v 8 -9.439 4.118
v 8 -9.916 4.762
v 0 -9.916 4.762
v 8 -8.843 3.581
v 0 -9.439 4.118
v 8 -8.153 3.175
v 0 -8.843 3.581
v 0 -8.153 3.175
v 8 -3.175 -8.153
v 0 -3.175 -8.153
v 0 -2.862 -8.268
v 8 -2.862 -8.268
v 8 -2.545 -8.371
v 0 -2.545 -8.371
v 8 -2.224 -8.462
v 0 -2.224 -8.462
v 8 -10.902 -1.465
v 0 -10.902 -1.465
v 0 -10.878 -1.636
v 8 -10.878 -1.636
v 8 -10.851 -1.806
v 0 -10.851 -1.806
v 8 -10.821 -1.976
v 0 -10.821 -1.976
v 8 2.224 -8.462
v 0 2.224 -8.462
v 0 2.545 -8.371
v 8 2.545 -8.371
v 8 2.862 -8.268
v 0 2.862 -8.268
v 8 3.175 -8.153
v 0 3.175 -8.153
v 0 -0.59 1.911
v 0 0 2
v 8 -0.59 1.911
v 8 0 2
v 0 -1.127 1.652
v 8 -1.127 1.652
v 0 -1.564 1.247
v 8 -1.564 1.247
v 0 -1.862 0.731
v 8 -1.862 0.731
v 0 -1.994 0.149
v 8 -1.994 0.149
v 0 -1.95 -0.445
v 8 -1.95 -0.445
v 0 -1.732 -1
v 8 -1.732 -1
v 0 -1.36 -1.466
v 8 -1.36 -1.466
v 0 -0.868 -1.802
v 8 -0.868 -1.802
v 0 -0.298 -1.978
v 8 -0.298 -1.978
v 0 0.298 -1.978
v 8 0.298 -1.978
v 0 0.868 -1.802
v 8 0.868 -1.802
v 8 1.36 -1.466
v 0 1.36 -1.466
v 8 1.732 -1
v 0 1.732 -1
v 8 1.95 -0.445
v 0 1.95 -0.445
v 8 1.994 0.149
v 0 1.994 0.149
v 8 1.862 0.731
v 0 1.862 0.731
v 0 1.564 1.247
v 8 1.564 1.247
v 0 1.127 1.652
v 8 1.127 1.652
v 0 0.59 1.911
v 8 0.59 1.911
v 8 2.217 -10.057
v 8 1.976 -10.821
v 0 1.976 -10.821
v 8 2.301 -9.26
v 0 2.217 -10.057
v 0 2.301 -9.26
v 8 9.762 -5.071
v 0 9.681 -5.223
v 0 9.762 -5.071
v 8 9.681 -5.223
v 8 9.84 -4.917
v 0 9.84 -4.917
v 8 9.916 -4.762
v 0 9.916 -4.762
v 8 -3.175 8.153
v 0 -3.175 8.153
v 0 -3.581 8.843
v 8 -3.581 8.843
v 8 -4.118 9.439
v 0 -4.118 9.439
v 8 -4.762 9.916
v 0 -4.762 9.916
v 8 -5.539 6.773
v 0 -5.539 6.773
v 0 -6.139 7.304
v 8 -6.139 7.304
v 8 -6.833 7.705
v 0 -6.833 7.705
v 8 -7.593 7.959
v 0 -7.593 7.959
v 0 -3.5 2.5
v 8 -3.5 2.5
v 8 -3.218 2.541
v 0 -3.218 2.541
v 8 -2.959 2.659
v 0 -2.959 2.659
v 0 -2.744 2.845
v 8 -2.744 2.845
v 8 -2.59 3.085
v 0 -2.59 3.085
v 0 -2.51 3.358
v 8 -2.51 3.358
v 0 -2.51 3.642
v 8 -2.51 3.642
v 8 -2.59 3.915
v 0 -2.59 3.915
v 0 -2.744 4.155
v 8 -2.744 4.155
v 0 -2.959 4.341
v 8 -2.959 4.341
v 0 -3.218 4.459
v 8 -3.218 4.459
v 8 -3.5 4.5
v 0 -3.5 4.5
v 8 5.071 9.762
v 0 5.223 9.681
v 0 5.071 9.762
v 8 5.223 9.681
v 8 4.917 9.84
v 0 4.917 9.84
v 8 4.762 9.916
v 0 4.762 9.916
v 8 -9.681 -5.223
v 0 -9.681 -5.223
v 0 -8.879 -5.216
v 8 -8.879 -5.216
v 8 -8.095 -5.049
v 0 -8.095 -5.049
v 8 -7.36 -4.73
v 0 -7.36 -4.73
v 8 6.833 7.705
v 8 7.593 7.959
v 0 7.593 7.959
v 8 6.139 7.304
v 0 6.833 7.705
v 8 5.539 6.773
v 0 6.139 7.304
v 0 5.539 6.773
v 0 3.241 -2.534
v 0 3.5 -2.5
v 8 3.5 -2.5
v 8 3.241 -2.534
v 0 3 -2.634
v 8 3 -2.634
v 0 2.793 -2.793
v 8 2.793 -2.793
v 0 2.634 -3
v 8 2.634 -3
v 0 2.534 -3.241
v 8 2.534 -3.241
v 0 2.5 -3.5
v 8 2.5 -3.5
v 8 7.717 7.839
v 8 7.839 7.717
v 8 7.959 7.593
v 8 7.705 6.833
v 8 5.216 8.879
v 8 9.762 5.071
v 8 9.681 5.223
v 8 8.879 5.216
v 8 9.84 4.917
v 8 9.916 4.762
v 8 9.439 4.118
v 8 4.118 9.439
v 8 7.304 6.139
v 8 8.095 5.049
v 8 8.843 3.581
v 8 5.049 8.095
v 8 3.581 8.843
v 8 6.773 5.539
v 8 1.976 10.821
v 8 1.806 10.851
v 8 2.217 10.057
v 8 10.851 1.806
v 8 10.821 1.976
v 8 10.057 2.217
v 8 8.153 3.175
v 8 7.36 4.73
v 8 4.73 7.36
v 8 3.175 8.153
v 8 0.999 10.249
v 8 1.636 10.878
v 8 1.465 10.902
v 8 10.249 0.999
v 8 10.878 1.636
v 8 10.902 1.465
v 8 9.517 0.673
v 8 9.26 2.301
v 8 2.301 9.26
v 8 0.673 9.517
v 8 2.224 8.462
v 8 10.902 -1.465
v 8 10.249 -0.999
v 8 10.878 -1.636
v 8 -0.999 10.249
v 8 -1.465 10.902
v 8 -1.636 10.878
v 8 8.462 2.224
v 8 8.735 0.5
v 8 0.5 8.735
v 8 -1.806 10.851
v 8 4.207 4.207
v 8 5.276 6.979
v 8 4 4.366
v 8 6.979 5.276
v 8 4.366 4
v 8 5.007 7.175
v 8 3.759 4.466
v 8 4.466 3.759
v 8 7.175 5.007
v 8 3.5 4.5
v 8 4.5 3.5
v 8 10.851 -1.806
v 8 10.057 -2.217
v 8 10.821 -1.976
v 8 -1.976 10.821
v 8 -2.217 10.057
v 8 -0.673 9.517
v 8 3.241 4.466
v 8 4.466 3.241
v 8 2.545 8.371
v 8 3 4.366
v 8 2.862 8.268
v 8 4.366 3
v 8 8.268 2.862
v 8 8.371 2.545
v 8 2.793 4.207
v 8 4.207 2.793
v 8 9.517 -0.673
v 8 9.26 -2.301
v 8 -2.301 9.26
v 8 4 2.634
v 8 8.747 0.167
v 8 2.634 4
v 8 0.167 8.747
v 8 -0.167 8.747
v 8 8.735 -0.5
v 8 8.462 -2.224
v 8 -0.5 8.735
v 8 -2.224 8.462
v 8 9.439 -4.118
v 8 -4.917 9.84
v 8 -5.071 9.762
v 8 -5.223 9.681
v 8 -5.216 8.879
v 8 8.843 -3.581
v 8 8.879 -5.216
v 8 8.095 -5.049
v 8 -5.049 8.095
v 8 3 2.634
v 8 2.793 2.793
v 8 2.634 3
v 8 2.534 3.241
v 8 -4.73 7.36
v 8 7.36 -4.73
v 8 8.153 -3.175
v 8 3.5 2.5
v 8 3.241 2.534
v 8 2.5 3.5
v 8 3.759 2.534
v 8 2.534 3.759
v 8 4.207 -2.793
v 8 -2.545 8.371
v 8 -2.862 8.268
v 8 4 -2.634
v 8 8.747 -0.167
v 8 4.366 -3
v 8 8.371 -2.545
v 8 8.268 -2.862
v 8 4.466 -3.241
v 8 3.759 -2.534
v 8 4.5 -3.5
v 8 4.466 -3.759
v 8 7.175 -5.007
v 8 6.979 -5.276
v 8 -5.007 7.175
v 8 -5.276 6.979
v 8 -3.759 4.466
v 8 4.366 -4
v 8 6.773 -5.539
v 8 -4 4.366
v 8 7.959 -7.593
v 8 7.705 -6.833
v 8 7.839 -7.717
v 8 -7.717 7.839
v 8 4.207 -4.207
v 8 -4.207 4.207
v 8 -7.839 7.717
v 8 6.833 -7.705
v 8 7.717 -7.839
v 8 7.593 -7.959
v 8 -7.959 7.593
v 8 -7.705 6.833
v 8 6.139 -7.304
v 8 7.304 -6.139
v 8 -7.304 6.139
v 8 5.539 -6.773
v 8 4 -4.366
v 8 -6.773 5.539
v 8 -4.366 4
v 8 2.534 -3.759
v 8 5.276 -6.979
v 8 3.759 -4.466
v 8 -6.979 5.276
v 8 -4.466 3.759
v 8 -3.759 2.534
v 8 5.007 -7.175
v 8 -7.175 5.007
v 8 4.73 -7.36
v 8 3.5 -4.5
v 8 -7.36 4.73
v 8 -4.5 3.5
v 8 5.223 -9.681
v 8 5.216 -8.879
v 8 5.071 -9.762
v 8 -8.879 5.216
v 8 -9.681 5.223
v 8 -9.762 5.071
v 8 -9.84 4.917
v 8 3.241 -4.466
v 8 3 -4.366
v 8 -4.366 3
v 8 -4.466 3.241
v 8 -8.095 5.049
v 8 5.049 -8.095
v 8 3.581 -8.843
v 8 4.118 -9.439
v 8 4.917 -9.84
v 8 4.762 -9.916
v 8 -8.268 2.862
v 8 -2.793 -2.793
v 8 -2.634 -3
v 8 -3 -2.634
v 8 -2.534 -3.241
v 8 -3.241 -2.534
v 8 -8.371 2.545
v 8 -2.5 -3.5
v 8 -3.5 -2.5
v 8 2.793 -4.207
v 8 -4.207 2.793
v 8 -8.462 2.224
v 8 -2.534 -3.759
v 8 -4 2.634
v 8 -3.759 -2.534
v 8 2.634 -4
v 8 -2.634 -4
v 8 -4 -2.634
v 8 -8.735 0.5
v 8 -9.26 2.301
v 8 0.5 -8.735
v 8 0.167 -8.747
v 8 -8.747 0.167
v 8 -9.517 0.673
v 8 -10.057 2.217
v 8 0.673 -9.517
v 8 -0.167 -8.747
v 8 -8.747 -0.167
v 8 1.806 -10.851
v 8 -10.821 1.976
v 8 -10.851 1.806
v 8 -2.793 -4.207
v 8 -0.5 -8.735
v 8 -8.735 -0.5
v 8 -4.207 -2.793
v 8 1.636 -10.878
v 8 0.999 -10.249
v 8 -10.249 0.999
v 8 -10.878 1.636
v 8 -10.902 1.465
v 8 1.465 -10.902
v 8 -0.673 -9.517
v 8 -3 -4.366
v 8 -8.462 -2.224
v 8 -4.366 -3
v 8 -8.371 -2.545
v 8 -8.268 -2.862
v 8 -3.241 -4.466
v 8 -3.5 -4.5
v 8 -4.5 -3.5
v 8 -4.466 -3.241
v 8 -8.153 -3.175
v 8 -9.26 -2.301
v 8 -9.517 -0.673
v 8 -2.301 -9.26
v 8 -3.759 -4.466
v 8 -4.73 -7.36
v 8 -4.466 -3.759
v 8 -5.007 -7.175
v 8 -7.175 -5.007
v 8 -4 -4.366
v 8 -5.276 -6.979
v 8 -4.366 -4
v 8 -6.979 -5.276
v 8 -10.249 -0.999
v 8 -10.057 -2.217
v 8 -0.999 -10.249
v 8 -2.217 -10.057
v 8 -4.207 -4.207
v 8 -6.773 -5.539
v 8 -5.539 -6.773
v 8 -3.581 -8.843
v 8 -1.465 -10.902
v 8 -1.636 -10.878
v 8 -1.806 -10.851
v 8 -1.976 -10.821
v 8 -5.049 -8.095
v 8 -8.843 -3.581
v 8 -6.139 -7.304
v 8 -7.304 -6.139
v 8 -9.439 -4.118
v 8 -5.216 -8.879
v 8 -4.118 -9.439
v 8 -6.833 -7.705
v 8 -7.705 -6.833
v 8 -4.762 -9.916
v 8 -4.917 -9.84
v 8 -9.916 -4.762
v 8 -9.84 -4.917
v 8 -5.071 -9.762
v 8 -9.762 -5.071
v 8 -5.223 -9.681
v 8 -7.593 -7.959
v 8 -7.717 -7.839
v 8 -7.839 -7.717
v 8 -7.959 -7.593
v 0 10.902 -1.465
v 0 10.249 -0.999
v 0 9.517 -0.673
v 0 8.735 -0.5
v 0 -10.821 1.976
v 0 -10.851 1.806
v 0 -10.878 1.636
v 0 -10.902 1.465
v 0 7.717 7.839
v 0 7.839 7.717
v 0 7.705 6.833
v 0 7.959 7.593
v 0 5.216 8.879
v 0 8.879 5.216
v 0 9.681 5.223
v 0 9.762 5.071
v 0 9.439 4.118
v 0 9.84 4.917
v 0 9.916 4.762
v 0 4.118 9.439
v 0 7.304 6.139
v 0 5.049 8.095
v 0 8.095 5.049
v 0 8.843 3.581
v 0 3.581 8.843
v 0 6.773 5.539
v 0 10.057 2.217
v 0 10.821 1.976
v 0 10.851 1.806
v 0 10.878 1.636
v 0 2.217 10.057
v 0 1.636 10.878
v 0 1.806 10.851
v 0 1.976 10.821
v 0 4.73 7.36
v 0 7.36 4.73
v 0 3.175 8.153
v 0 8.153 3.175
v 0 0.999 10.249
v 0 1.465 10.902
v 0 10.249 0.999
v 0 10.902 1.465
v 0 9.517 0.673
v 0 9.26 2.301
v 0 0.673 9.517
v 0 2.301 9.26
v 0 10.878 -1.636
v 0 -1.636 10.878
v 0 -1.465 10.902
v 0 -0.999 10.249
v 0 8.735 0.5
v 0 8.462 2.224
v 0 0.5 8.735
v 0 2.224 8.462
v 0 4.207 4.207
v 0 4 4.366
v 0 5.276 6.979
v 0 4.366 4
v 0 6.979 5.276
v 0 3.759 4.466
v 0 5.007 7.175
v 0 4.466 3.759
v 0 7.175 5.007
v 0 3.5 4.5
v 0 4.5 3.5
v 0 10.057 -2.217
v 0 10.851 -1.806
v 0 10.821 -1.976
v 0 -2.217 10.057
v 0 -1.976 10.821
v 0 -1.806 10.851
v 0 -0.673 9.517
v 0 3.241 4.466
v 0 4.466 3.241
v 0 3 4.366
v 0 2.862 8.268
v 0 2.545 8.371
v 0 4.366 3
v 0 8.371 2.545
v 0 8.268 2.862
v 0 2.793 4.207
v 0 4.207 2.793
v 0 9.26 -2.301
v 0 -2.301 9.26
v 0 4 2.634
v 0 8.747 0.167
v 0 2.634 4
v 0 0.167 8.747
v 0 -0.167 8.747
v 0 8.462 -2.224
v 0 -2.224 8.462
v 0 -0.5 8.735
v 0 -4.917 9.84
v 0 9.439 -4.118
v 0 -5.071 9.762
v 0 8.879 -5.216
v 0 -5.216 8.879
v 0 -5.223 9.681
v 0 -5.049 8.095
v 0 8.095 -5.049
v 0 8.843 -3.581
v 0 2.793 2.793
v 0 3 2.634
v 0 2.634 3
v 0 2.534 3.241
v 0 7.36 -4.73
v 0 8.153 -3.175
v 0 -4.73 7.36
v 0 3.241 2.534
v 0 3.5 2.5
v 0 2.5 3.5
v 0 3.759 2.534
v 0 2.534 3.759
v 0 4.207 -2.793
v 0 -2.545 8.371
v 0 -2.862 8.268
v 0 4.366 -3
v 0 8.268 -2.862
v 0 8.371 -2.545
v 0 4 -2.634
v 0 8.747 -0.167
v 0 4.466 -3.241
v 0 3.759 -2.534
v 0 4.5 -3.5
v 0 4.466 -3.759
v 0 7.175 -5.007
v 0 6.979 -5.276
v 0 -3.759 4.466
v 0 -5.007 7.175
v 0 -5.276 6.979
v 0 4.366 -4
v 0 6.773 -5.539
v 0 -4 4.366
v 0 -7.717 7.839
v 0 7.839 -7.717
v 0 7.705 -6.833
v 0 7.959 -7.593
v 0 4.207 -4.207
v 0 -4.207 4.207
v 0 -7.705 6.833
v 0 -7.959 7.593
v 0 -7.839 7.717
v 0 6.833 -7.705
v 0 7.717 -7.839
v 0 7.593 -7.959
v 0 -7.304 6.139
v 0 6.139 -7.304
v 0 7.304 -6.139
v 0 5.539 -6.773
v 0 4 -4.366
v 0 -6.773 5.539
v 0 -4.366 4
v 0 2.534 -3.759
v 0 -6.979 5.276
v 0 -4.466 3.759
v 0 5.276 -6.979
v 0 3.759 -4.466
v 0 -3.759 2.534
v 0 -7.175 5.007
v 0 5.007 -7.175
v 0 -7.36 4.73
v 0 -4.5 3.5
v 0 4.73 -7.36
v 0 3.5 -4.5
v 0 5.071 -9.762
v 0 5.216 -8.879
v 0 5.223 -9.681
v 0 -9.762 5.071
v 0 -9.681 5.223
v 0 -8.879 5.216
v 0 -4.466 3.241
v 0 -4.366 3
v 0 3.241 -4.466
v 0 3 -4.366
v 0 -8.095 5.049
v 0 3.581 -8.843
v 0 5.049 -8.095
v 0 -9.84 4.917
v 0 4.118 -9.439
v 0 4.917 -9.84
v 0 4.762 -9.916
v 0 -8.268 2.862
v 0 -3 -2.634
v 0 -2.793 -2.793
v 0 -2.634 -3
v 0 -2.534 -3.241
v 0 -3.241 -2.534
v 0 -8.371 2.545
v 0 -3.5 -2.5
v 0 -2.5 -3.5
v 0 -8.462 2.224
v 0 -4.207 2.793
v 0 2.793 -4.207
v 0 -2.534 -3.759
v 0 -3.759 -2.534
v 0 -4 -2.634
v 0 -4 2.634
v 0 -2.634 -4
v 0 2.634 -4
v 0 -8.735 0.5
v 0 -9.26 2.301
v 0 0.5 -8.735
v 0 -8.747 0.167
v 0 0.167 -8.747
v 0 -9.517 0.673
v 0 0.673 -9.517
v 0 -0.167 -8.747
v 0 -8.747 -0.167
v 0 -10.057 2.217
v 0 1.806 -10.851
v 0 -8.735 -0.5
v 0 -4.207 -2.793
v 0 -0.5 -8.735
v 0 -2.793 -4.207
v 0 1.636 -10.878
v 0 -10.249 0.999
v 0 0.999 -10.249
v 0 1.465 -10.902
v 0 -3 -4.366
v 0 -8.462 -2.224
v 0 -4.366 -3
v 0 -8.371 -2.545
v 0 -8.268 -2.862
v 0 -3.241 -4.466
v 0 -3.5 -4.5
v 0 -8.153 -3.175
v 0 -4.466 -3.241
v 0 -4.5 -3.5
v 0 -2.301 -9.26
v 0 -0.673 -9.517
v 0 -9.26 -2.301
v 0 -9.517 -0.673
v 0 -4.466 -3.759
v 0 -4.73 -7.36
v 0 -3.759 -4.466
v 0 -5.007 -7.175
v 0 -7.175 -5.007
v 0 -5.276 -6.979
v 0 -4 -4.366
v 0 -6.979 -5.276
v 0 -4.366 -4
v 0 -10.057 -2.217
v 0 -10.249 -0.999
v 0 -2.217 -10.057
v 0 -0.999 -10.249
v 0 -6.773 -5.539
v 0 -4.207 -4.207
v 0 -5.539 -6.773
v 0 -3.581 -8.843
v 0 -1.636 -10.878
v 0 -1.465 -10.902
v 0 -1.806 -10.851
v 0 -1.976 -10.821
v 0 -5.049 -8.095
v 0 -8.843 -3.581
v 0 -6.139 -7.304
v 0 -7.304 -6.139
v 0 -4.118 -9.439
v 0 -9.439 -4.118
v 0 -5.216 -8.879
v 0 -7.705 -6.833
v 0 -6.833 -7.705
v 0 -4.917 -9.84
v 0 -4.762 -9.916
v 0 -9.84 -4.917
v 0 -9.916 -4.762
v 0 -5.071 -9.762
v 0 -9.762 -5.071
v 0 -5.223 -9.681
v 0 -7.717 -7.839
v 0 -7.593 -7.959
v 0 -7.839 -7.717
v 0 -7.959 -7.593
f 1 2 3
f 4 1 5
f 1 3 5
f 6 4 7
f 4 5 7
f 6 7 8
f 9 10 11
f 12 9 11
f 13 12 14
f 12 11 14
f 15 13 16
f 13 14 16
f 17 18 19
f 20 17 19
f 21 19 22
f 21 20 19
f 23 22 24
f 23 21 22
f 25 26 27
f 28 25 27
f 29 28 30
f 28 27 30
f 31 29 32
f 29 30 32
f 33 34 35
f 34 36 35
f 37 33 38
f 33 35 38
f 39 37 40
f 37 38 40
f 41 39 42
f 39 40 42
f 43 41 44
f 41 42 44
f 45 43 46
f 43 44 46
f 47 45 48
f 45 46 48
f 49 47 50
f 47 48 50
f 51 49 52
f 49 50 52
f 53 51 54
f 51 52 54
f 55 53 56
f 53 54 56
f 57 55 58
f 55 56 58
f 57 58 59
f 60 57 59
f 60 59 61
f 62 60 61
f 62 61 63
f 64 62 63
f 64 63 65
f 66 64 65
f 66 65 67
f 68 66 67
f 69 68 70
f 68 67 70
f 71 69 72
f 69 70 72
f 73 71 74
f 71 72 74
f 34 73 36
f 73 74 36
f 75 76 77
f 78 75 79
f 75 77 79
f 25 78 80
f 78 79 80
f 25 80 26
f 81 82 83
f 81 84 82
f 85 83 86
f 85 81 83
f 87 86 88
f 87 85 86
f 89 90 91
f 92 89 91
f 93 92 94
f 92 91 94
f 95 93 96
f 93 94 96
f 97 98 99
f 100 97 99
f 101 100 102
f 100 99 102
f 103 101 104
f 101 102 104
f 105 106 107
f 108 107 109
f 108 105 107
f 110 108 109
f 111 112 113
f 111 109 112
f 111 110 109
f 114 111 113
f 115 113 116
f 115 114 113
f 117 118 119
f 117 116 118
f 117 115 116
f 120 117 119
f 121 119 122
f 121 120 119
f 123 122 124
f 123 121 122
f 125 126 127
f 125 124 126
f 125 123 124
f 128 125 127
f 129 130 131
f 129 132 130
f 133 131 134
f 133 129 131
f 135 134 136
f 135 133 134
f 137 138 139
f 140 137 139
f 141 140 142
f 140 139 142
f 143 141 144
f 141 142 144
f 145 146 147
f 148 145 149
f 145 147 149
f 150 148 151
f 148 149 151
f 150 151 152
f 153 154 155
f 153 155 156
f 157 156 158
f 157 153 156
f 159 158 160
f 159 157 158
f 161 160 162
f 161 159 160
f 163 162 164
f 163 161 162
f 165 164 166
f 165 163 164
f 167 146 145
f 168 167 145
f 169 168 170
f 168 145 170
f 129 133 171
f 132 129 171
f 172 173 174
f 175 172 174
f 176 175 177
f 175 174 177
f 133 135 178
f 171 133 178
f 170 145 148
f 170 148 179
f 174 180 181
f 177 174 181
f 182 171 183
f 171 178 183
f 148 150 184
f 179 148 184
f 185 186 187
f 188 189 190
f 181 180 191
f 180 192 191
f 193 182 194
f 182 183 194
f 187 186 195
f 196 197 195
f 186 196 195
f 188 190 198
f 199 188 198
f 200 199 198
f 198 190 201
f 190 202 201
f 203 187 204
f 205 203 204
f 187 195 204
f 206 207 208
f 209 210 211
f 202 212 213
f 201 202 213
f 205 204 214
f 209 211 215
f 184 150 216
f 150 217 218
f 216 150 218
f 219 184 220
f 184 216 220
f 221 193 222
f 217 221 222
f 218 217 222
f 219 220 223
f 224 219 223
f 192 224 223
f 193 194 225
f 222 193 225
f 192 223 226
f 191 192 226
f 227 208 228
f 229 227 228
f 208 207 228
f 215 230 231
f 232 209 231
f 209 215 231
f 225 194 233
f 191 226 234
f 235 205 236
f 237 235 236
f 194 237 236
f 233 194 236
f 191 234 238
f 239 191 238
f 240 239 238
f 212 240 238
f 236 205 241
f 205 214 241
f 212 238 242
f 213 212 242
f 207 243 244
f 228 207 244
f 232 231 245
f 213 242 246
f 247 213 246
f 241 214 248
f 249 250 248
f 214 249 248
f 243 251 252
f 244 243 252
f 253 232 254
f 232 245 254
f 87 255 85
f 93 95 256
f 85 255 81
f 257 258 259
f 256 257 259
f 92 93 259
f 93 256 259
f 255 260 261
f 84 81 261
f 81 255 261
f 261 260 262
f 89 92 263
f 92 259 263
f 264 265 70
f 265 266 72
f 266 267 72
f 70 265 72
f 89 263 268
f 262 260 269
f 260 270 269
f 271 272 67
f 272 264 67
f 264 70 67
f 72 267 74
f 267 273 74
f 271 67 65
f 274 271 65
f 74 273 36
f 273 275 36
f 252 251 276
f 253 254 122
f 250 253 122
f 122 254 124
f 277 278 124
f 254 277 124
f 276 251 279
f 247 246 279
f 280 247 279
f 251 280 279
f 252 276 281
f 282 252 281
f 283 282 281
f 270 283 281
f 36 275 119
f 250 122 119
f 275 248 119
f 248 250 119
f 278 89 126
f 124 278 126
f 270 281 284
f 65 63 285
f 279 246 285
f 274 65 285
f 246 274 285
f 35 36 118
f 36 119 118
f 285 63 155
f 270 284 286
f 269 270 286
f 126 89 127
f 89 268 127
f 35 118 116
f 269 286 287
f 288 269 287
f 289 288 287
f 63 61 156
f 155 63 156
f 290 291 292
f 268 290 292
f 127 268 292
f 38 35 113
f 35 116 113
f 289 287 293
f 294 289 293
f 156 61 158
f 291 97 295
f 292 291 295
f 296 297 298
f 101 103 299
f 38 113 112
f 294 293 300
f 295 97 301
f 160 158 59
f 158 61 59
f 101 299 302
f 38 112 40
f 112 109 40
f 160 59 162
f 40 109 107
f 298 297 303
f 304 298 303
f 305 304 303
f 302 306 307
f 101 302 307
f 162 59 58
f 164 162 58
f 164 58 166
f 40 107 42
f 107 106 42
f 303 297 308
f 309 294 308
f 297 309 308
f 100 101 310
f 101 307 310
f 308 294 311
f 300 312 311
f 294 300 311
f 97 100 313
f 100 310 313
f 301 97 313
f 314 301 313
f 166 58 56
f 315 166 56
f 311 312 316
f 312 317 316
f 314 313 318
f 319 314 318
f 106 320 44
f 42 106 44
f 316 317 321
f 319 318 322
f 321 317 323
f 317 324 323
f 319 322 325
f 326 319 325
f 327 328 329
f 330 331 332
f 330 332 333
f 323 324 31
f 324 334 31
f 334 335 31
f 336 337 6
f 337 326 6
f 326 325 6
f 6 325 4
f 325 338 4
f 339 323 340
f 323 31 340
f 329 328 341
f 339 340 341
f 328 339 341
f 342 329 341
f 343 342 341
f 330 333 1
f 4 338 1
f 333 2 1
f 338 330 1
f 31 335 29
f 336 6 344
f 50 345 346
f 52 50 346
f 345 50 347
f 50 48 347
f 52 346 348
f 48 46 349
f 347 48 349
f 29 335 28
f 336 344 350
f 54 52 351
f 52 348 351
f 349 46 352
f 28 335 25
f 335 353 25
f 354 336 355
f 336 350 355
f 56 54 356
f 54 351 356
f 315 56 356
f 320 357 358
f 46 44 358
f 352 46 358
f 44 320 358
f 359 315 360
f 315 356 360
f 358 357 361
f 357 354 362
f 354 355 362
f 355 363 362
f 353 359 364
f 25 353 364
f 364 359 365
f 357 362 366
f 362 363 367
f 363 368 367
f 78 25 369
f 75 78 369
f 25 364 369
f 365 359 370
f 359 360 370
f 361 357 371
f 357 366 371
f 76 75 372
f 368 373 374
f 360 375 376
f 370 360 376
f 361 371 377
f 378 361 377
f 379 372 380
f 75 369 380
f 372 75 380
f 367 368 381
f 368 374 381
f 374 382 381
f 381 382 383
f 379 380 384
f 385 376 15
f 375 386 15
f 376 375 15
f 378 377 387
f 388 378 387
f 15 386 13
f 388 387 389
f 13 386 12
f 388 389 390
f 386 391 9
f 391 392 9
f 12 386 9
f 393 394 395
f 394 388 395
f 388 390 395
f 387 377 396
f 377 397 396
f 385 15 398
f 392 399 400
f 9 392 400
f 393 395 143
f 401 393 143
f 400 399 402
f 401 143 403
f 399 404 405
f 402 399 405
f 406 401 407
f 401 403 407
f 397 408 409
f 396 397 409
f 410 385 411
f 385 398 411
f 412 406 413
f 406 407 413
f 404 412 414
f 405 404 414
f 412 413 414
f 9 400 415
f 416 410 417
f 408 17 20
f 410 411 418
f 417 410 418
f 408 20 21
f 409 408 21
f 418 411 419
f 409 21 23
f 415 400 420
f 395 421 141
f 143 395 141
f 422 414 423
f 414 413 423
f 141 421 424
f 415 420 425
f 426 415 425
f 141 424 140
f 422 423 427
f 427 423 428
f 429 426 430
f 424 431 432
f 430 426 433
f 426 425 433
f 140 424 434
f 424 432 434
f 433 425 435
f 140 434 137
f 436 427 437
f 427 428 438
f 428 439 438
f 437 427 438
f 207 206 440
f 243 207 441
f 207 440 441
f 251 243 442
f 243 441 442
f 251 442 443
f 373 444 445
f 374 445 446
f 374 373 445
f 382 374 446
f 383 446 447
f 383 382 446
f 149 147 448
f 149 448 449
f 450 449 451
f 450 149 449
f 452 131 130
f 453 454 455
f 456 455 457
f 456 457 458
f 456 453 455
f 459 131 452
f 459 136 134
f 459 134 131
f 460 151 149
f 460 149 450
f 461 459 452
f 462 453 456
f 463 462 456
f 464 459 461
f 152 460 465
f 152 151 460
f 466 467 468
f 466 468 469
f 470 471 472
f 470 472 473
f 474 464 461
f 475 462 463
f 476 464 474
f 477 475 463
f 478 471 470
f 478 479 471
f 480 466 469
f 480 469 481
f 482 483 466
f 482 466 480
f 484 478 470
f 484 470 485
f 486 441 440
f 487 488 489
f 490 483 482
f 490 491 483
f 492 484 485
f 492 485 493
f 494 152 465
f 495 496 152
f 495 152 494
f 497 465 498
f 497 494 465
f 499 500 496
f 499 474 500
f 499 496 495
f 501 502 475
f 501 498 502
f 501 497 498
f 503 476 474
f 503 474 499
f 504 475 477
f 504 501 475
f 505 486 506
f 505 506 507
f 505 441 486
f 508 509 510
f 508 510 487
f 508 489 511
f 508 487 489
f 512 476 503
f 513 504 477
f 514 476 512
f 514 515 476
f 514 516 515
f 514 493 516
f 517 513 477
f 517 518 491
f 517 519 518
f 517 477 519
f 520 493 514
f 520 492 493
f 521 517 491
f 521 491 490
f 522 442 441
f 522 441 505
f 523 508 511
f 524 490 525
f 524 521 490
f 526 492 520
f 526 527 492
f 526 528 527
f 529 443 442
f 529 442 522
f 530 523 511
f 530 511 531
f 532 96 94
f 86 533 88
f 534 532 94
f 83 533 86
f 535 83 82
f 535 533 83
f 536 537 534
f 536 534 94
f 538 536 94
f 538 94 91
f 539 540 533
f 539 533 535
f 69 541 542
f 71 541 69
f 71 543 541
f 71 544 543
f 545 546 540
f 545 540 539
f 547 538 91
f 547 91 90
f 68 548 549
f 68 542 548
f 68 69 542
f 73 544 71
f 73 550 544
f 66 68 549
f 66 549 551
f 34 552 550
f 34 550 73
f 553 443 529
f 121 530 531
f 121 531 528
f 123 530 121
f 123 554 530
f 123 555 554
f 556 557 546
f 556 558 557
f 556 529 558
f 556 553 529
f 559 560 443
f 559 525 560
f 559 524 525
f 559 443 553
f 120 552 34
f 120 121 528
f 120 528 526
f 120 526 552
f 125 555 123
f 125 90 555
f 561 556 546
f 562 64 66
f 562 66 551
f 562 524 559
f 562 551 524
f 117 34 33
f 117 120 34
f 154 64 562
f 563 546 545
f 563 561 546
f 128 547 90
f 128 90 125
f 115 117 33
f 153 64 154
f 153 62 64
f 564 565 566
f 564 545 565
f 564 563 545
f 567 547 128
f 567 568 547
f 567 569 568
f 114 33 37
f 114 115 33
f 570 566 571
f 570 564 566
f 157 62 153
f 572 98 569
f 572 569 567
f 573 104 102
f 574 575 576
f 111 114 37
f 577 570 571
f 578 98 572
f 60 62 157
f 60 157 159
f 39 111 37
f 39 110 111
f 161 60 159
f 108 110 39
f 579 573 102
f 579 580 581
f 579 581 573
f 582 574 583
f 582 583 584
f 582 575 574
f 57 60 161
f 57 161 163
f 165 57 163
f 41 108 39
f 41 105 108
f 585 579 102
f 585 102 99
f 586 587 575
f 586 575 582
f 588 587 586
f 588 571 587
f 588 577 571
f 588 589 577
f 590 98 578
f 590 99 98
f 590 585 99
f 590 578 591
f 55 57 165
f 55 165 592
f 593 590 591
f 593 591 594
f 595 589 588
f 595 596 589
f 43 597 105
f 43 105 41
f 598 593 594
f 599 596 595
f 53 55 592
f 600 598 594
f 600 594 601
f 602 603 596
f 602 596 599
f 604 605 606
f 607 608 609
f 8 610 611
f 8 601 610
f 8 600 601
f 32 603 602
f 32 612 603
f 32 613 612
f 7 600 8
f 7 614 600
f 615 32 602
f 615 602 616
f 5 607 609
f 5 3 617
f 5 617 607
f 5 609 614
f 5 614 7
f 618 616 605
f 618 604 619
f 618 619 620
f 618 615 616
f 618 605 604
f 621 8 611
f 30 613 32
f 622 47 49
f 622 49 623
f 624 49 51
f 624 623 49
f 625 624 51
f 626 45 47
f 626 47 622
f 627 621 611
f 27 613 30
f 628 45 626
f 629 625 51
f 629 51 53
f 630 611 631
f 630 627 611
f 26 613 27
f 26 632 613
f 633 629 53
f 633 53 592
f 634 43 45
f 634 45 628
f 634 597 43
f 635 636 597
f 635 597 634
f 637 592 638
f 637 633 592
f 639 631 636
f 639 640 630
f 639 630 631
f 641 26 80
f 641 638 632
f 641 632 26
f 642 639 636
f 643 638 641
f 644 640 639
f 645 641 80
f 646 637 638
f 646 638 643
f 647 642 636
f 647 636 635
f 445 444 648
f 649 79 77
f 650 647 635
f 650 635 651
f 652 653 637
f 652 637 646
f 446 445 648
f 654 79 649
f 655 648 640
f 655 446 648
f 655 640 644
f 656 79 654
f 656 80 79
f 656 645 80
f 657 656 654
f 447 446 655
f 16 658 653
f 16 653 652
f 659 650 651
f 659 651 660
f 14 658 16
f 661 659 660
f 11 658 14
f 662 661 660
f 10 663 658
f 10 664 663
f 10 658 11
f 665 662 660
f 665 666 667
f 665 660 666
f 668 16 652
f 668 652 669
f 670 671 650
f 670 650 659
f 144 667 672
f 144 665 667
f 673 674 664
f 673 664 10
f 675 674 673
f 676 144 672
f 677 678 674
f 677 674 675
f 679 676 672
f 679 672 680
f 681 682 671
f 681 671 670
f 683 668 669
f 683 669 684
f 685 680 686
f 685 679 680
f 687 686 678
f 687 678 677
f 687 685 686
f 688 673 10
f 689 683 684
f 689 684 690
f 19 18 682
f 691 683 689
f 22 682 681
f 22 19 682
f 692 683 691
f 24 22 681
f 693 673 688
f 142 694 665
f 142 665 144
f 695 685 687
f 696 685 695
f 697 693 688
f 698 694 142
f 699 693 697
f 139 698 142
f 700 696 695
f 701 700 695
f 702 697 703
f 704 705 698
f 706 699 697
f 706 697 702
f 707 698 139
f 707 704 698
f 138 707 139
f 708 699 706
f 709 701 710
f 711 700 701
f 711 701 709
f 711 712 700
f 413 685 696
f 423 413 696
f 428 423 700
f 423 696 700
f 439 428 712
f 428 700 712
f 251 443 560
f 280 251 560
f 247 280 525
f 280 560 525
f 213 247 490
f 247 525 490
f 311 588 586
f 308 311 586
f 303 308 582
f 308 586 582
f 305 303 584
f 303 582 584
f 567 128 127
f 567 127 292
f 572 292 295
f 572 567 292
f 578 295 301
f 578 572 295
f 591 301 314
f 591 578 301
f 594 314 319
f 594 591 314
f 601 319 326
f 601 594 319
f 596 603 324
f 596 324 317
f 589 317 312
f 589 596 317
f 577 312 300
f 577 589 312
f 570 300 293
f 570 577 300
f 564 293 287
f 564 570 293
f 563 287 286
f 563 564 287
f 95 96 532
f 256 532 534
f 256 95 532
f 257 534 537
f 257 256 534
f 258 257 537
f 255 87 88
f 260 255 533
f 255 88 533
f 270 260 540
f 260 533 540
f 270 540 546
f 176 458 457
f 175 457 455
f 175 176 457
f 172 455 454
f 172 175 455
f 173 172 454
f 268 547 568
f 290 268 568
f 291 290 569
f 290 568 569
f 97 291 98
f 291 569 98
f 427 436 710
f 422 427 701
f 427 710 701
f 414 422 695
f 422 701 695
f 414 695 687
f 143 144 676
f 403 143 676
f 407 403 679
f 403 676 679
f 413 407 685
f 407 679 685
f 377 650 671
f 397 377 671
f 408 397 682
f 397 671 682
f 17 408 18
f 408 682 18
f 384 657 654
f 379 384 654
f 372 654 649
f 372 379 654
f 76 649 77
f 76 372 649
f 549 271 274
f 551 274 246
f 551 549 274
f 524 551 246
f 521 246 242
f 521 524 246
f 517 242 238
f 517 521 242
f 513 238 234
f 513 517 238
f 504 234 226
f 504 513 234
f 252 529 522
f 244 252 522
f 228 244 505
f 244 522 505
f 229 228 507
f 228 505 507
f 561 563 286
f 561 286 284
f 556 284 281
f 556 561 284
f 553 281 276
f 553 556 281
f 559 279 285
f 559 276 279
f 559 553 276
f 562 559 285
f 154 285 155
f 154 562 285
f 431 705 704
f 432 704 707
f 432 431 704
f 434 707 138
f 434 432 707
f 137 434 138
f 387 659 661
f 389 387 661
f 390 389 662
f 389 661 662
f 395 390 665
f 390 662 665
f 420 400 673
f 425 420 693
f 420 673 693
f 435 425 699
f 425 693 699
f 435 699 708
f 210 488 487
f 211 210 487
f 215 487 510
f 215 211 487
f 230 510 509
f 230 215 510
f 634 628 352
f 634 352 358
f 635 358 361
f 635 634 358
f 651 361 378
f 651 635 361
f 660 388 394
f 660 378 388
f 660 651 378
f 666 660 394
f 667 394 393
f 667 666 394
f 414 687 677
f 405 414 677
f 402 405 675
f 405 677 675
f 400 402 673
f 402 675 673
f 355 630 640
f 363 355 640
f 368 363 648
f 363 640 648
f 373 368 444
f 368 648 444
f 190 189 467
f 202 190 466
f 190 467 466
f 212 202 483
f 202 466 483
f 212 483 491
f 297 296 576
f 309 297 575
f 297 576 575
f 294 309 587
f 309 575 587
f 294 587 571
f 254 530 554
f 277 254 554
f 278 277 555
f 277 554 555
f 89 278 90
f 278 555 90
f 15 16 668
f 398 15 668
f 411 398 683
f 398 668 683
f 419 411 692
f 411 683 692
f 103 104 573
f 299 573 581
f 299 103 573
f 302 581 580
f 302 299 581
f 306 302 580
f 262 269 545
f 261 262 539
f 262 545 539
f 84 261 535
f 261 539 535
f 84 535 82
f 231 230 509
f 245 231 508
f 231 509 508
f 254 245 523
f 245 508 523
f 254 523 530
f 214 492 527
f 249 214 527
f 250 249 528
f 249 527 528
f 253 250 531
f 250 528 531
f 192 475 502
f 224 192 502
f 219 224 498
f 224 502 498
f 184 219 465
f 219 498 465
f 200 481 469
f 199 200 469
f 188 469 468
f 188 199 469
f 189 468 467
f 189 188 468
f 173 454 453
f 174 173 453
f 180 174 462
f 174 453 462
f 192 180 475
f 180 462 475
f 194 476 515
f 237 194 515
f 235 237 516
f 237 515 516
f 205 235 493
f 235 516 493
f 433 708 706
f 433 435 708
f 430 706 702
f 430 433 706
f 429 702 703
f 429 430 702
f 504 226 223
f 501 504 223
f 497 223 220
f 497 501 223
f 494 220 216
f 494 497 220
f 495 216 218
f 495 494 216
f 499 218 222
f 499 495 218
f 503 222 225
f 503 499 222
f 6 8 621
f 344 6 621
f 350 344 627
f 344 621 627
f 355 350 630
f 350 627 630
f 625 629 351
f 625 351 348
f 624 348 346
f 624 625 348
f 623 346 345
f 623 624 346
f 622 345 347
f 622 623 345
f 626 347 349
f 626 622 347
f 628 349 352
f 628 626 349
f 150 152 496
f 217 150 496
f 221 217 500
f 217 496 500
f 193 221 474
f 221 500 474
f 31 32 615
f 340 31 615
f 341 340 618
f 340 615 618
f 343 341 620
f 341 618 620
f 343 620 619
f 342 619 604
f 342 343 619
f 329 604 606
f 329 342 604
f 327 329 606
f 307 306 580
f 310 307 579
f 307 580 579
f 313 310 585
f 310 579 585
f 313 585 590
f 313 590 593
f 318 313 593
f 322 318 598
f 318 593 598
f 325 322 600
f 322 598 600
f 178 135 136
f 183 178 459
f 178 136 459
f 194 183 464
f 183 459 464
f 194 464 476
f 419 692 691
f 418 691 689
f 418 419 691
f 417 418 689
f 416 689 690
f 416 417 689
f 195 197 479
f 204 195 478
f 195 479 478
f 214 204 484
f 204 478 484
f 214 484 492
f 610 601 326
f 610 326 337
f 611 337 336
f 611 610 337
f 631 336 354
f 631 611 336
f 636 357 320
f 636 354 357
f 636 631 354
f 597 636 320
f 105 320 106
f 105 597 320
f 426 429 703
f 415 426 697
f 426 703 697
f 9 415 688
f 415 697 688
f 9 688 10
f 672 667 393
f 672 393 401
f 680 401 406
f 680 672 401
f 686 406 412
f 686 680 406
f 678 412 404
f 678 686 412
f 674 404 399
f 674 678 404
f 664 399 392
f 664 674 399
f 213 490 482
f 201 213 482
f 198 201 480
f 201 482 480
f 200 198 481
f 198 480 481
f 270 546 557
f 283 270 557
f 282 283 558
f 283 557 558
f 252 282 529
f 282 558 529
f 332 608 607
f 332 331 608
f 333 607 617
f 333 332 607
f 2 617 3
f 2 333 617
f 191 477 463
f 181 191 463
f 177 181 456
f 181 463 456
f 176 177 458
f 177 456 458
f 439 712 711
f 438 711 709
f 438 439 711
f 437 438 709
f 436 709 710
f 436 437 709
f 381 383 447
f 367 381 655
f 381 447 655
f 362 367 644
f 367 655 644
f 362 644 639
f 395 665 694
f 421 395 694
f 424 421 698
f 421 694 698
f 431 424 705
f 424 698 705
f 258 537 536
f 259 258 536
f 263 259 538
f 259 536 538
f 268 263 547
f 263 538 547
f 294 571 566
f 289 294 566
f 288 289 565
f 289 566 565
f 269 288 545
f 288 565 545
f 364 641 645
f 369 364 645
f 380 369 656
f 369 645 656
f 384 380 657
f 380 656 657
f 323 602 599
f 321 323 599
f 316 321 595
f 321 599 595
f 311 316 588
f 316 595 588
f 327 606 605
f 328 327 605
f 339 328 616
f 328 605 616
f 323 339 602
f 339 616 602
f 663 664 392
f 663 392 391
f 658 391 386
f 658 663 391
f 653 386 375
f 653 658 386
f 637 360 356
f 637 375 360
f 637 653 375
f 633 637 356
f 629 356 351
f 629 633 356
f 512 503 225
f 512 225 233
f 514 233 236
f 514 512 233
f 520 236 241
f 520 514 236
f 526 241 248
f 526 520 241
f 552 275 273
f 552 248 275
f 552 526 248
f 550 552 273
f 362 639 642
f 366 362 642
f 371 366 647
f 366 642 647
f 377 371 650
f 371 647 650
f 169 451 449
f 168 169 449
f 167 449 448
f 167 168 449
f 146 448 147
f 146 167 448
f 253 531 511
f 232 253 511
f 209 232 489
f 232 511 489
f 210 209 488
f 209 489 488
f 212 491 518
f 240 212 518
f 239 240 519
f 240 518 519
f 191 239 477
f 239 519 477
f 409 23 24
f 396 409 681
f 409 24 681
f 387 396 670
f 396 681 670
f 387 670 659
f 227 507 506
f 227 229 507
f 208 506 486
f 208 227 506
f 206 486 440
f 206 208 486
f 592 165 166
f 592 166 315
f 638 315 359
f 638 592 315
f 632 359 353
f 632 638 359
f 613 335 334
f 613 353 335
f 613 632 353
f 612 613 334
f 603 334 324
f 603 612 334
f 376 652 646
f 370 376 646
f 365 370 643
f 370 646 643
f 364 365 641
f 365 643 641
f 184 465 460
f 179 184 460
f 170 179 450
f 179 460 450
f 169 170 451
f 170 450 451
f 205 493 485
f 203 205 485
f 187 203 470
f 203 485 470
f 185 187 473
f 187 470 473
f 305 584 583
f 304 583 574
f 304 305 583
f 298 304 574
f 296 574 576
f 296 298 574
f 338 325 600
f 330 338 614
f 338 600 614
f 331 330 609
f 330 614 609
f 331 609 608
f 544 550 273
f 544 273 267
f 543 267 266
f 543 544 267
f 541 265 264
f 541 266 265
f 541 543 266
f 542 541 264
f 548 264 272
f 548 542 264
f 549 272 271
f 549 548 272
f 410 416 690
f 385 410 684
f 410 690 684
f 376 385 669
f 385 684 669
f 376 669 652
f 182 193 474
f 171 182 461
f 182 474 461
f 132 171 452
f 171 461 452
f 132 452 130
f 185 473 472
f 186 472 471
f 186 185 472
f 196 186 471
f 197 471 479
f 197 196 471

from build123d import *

# Parameters (mm, degrees)
BASPROSKE_W             = 8
BASPROSKE_H             = 11
TOOTHCUT_DEPTH          = 18.492855685
TEETHCUTS_COUNT         = 20
TEETHCUTS_ANGLE         = 342
BORSKE_R                = 2
BORE_DEPTH              = 50.0000508
CUT_EXTRUDE1_DEPTH      = 6
CUT_EXTRUDE1_DEPTH_BACK = 13


with BuildPart() as part:
    # BasProSke → Base-Revolve (revolve)
    with BuildSketch(Plane(origin=(0, 0, 0), x_dir=(1, 0, 0), z_dir=(0, 1, 0)), mode=Mode.PRIVATE) as base_revolve_sk:
        with Locations((4, 5.5)):
            Rectangle(BASPROSKE_W, BASPROSKE_H)
    revolve(base_revolve_sk.sketch.rotate(Axis((-10, 0, 0), (1, 0, 0)), 180), axis=Axis((-10, 0, 0), (1, 0, 0)))

    # TooCutSke → ToothCut (cut, through all)
    with BuildSketch(Plane(origin=(0, 0, 0), x_dir=(0, 0, -1), z_dir=(1, 0, 0))):
        with BuildLine():
            ThreePointArc((0.499924007, 8.734705318), (0, 8.749), (-0.499924007, 8.734705318))
            ThreePointArc((-0.499924007, 8.734705318), (-0.824302243, 9.905497836), (-1.485192705, 10.924909509))
            ThreePointArc((-1.485192705, 10.924909509), (0, 11.0254), (1.485192705, 10.924909509))
            ThreePointArc((1.485192705, 10.924909509), (0.824302243, 9.905497836), (0.499924007, 8.734705318))
        make_face()
    toothcut = extrude(amount=TOOTHCUT_DEPTH, mode=Mode.SUBTRACT)

    # TeethCuts: ToothCut ×20 about axis
    teethcuts_axis = Axis((-10, 0, 0), (1, 0, 0))
    for i in range(1, TEETHCUTS_COUNT):
        add(toothcut.rotate(teethcuts_axis, i * TEETHCUTS_ANGLE / (TEETHCUTS_COUNT - 1)), mode=Mode.SUBTRACT)

    # BorSke → Bore (cut, symmetric)
    with BuildSketch(Plane(origin=(0, 0, 0), x_dir=(0, 0, -1), z_dir=(1, 0, 0))):
        with Locations(Location((0, 0, 0), (0, 0, 180))):
            Circle(BORSKE_R)
    extrude(amount=BORE_DEPTH, both=True, mode=Mode.SUBTRACT)

    # Sketch1 → Cut-Extrude1 (cut, two sides: drawn at the far end of the back side and taken through both)
    with BuildSketch(Plane(origin=(8, 0, 0), x_dir=(0, 0, -1), z_dir=(1, 0, 0)).offset(-CUT_EXTRUDE1_DEPTH_BACK)):
        with BuildLine():
            ThreePointArc((-2.5, -3.5), (-3.5, -2.5), (-4.5, -3.5))
            Line((-4.5, -3.5), (-2.5, -3.5))
        make_face()
        with BuildLine():
            Line((-2.5, -3.5), (-4.5, -3.5))
            ThreePointArc((-4.5, -3.5), (-4.207106781, -4.207106781), (-3.5, -4.5))
            ThreePointArc((-3.5, -4.5), (-2.792893219, -4.207106781), (-2.5, -3.5))
        make_face()
        with BuildLine():
            ThreePointArc((-3.499999992, 4.5), (-4.207106778, 4.207106784), (-4.5, 3.5))
            Line((-4.5, 3.5), (-2.5, 3.5))
            ThreePointArc((-2.5, 3.5), (-2.792893216, 4.207106778), (-3.499999992, 4.5))
        make_face()
        with BuildLine():
            Line((-2.5, 3.5), (-4.5, 3.5))
            ThreePointArc((-4.5, 3.5), (-4.207106779, 2.792893217), (-3.499999995, 2.5))
            ThreePointArc((-3.499999995, 2.5), (-2.792893217, 2.792893221), (-2.5, 3.5))
        make_face()
        with BuildLine():
            ThreePointArc((3.5, 2.5), (4.207106781, 2.792893219), (4.5, 3.5))
            Line((4.5, 3.5), (2.5, 3.5))
            ThreePointArc((2.5, 3.5), (2.792893219, 2.792893219), (3.5, 2.5))
        make_face()
        with BuildLine():
            Line((2.5, 3.5), (4.5, 3.5))
            ThreePointArc((4.5, 3.5), (4.207106781, 4.207106781), (3.5, 4.5))
            ThreePointArc((3.5, 4.5), (2.792893219, 4.207106781), (2.5, 3.5))
        make_face()
        with BuildLine():
            ThreePointArc((3.5, -4.5), (4.207106781, -4.207106781), (4.5, -3.5))
            Line((4.5, -3.5), (2.5, -3.5))
            ThreePointArc((2.5, -3.5), (2.792893219, -4.207106781), (3.5, -4.5))
        make_face()
        with BuildLine():
            Line((2.5, -3.5), (4.5, -3.5))
            ThreePointArc((4.5, -3.5), (4.207106781, -2.792893219), (3.5, -2.5))
            ThreePointArc((3.5, -2.5), (2.792893219, -2.792893219), (2.5, -3.5))
        make_face()
    extrude(amount=CUT_EXTRUDE1_DEPTH + CUT_EXTRUDE1_DEPTH_BACK, mode=Mode.SUBTRACT)


solid = part.part
